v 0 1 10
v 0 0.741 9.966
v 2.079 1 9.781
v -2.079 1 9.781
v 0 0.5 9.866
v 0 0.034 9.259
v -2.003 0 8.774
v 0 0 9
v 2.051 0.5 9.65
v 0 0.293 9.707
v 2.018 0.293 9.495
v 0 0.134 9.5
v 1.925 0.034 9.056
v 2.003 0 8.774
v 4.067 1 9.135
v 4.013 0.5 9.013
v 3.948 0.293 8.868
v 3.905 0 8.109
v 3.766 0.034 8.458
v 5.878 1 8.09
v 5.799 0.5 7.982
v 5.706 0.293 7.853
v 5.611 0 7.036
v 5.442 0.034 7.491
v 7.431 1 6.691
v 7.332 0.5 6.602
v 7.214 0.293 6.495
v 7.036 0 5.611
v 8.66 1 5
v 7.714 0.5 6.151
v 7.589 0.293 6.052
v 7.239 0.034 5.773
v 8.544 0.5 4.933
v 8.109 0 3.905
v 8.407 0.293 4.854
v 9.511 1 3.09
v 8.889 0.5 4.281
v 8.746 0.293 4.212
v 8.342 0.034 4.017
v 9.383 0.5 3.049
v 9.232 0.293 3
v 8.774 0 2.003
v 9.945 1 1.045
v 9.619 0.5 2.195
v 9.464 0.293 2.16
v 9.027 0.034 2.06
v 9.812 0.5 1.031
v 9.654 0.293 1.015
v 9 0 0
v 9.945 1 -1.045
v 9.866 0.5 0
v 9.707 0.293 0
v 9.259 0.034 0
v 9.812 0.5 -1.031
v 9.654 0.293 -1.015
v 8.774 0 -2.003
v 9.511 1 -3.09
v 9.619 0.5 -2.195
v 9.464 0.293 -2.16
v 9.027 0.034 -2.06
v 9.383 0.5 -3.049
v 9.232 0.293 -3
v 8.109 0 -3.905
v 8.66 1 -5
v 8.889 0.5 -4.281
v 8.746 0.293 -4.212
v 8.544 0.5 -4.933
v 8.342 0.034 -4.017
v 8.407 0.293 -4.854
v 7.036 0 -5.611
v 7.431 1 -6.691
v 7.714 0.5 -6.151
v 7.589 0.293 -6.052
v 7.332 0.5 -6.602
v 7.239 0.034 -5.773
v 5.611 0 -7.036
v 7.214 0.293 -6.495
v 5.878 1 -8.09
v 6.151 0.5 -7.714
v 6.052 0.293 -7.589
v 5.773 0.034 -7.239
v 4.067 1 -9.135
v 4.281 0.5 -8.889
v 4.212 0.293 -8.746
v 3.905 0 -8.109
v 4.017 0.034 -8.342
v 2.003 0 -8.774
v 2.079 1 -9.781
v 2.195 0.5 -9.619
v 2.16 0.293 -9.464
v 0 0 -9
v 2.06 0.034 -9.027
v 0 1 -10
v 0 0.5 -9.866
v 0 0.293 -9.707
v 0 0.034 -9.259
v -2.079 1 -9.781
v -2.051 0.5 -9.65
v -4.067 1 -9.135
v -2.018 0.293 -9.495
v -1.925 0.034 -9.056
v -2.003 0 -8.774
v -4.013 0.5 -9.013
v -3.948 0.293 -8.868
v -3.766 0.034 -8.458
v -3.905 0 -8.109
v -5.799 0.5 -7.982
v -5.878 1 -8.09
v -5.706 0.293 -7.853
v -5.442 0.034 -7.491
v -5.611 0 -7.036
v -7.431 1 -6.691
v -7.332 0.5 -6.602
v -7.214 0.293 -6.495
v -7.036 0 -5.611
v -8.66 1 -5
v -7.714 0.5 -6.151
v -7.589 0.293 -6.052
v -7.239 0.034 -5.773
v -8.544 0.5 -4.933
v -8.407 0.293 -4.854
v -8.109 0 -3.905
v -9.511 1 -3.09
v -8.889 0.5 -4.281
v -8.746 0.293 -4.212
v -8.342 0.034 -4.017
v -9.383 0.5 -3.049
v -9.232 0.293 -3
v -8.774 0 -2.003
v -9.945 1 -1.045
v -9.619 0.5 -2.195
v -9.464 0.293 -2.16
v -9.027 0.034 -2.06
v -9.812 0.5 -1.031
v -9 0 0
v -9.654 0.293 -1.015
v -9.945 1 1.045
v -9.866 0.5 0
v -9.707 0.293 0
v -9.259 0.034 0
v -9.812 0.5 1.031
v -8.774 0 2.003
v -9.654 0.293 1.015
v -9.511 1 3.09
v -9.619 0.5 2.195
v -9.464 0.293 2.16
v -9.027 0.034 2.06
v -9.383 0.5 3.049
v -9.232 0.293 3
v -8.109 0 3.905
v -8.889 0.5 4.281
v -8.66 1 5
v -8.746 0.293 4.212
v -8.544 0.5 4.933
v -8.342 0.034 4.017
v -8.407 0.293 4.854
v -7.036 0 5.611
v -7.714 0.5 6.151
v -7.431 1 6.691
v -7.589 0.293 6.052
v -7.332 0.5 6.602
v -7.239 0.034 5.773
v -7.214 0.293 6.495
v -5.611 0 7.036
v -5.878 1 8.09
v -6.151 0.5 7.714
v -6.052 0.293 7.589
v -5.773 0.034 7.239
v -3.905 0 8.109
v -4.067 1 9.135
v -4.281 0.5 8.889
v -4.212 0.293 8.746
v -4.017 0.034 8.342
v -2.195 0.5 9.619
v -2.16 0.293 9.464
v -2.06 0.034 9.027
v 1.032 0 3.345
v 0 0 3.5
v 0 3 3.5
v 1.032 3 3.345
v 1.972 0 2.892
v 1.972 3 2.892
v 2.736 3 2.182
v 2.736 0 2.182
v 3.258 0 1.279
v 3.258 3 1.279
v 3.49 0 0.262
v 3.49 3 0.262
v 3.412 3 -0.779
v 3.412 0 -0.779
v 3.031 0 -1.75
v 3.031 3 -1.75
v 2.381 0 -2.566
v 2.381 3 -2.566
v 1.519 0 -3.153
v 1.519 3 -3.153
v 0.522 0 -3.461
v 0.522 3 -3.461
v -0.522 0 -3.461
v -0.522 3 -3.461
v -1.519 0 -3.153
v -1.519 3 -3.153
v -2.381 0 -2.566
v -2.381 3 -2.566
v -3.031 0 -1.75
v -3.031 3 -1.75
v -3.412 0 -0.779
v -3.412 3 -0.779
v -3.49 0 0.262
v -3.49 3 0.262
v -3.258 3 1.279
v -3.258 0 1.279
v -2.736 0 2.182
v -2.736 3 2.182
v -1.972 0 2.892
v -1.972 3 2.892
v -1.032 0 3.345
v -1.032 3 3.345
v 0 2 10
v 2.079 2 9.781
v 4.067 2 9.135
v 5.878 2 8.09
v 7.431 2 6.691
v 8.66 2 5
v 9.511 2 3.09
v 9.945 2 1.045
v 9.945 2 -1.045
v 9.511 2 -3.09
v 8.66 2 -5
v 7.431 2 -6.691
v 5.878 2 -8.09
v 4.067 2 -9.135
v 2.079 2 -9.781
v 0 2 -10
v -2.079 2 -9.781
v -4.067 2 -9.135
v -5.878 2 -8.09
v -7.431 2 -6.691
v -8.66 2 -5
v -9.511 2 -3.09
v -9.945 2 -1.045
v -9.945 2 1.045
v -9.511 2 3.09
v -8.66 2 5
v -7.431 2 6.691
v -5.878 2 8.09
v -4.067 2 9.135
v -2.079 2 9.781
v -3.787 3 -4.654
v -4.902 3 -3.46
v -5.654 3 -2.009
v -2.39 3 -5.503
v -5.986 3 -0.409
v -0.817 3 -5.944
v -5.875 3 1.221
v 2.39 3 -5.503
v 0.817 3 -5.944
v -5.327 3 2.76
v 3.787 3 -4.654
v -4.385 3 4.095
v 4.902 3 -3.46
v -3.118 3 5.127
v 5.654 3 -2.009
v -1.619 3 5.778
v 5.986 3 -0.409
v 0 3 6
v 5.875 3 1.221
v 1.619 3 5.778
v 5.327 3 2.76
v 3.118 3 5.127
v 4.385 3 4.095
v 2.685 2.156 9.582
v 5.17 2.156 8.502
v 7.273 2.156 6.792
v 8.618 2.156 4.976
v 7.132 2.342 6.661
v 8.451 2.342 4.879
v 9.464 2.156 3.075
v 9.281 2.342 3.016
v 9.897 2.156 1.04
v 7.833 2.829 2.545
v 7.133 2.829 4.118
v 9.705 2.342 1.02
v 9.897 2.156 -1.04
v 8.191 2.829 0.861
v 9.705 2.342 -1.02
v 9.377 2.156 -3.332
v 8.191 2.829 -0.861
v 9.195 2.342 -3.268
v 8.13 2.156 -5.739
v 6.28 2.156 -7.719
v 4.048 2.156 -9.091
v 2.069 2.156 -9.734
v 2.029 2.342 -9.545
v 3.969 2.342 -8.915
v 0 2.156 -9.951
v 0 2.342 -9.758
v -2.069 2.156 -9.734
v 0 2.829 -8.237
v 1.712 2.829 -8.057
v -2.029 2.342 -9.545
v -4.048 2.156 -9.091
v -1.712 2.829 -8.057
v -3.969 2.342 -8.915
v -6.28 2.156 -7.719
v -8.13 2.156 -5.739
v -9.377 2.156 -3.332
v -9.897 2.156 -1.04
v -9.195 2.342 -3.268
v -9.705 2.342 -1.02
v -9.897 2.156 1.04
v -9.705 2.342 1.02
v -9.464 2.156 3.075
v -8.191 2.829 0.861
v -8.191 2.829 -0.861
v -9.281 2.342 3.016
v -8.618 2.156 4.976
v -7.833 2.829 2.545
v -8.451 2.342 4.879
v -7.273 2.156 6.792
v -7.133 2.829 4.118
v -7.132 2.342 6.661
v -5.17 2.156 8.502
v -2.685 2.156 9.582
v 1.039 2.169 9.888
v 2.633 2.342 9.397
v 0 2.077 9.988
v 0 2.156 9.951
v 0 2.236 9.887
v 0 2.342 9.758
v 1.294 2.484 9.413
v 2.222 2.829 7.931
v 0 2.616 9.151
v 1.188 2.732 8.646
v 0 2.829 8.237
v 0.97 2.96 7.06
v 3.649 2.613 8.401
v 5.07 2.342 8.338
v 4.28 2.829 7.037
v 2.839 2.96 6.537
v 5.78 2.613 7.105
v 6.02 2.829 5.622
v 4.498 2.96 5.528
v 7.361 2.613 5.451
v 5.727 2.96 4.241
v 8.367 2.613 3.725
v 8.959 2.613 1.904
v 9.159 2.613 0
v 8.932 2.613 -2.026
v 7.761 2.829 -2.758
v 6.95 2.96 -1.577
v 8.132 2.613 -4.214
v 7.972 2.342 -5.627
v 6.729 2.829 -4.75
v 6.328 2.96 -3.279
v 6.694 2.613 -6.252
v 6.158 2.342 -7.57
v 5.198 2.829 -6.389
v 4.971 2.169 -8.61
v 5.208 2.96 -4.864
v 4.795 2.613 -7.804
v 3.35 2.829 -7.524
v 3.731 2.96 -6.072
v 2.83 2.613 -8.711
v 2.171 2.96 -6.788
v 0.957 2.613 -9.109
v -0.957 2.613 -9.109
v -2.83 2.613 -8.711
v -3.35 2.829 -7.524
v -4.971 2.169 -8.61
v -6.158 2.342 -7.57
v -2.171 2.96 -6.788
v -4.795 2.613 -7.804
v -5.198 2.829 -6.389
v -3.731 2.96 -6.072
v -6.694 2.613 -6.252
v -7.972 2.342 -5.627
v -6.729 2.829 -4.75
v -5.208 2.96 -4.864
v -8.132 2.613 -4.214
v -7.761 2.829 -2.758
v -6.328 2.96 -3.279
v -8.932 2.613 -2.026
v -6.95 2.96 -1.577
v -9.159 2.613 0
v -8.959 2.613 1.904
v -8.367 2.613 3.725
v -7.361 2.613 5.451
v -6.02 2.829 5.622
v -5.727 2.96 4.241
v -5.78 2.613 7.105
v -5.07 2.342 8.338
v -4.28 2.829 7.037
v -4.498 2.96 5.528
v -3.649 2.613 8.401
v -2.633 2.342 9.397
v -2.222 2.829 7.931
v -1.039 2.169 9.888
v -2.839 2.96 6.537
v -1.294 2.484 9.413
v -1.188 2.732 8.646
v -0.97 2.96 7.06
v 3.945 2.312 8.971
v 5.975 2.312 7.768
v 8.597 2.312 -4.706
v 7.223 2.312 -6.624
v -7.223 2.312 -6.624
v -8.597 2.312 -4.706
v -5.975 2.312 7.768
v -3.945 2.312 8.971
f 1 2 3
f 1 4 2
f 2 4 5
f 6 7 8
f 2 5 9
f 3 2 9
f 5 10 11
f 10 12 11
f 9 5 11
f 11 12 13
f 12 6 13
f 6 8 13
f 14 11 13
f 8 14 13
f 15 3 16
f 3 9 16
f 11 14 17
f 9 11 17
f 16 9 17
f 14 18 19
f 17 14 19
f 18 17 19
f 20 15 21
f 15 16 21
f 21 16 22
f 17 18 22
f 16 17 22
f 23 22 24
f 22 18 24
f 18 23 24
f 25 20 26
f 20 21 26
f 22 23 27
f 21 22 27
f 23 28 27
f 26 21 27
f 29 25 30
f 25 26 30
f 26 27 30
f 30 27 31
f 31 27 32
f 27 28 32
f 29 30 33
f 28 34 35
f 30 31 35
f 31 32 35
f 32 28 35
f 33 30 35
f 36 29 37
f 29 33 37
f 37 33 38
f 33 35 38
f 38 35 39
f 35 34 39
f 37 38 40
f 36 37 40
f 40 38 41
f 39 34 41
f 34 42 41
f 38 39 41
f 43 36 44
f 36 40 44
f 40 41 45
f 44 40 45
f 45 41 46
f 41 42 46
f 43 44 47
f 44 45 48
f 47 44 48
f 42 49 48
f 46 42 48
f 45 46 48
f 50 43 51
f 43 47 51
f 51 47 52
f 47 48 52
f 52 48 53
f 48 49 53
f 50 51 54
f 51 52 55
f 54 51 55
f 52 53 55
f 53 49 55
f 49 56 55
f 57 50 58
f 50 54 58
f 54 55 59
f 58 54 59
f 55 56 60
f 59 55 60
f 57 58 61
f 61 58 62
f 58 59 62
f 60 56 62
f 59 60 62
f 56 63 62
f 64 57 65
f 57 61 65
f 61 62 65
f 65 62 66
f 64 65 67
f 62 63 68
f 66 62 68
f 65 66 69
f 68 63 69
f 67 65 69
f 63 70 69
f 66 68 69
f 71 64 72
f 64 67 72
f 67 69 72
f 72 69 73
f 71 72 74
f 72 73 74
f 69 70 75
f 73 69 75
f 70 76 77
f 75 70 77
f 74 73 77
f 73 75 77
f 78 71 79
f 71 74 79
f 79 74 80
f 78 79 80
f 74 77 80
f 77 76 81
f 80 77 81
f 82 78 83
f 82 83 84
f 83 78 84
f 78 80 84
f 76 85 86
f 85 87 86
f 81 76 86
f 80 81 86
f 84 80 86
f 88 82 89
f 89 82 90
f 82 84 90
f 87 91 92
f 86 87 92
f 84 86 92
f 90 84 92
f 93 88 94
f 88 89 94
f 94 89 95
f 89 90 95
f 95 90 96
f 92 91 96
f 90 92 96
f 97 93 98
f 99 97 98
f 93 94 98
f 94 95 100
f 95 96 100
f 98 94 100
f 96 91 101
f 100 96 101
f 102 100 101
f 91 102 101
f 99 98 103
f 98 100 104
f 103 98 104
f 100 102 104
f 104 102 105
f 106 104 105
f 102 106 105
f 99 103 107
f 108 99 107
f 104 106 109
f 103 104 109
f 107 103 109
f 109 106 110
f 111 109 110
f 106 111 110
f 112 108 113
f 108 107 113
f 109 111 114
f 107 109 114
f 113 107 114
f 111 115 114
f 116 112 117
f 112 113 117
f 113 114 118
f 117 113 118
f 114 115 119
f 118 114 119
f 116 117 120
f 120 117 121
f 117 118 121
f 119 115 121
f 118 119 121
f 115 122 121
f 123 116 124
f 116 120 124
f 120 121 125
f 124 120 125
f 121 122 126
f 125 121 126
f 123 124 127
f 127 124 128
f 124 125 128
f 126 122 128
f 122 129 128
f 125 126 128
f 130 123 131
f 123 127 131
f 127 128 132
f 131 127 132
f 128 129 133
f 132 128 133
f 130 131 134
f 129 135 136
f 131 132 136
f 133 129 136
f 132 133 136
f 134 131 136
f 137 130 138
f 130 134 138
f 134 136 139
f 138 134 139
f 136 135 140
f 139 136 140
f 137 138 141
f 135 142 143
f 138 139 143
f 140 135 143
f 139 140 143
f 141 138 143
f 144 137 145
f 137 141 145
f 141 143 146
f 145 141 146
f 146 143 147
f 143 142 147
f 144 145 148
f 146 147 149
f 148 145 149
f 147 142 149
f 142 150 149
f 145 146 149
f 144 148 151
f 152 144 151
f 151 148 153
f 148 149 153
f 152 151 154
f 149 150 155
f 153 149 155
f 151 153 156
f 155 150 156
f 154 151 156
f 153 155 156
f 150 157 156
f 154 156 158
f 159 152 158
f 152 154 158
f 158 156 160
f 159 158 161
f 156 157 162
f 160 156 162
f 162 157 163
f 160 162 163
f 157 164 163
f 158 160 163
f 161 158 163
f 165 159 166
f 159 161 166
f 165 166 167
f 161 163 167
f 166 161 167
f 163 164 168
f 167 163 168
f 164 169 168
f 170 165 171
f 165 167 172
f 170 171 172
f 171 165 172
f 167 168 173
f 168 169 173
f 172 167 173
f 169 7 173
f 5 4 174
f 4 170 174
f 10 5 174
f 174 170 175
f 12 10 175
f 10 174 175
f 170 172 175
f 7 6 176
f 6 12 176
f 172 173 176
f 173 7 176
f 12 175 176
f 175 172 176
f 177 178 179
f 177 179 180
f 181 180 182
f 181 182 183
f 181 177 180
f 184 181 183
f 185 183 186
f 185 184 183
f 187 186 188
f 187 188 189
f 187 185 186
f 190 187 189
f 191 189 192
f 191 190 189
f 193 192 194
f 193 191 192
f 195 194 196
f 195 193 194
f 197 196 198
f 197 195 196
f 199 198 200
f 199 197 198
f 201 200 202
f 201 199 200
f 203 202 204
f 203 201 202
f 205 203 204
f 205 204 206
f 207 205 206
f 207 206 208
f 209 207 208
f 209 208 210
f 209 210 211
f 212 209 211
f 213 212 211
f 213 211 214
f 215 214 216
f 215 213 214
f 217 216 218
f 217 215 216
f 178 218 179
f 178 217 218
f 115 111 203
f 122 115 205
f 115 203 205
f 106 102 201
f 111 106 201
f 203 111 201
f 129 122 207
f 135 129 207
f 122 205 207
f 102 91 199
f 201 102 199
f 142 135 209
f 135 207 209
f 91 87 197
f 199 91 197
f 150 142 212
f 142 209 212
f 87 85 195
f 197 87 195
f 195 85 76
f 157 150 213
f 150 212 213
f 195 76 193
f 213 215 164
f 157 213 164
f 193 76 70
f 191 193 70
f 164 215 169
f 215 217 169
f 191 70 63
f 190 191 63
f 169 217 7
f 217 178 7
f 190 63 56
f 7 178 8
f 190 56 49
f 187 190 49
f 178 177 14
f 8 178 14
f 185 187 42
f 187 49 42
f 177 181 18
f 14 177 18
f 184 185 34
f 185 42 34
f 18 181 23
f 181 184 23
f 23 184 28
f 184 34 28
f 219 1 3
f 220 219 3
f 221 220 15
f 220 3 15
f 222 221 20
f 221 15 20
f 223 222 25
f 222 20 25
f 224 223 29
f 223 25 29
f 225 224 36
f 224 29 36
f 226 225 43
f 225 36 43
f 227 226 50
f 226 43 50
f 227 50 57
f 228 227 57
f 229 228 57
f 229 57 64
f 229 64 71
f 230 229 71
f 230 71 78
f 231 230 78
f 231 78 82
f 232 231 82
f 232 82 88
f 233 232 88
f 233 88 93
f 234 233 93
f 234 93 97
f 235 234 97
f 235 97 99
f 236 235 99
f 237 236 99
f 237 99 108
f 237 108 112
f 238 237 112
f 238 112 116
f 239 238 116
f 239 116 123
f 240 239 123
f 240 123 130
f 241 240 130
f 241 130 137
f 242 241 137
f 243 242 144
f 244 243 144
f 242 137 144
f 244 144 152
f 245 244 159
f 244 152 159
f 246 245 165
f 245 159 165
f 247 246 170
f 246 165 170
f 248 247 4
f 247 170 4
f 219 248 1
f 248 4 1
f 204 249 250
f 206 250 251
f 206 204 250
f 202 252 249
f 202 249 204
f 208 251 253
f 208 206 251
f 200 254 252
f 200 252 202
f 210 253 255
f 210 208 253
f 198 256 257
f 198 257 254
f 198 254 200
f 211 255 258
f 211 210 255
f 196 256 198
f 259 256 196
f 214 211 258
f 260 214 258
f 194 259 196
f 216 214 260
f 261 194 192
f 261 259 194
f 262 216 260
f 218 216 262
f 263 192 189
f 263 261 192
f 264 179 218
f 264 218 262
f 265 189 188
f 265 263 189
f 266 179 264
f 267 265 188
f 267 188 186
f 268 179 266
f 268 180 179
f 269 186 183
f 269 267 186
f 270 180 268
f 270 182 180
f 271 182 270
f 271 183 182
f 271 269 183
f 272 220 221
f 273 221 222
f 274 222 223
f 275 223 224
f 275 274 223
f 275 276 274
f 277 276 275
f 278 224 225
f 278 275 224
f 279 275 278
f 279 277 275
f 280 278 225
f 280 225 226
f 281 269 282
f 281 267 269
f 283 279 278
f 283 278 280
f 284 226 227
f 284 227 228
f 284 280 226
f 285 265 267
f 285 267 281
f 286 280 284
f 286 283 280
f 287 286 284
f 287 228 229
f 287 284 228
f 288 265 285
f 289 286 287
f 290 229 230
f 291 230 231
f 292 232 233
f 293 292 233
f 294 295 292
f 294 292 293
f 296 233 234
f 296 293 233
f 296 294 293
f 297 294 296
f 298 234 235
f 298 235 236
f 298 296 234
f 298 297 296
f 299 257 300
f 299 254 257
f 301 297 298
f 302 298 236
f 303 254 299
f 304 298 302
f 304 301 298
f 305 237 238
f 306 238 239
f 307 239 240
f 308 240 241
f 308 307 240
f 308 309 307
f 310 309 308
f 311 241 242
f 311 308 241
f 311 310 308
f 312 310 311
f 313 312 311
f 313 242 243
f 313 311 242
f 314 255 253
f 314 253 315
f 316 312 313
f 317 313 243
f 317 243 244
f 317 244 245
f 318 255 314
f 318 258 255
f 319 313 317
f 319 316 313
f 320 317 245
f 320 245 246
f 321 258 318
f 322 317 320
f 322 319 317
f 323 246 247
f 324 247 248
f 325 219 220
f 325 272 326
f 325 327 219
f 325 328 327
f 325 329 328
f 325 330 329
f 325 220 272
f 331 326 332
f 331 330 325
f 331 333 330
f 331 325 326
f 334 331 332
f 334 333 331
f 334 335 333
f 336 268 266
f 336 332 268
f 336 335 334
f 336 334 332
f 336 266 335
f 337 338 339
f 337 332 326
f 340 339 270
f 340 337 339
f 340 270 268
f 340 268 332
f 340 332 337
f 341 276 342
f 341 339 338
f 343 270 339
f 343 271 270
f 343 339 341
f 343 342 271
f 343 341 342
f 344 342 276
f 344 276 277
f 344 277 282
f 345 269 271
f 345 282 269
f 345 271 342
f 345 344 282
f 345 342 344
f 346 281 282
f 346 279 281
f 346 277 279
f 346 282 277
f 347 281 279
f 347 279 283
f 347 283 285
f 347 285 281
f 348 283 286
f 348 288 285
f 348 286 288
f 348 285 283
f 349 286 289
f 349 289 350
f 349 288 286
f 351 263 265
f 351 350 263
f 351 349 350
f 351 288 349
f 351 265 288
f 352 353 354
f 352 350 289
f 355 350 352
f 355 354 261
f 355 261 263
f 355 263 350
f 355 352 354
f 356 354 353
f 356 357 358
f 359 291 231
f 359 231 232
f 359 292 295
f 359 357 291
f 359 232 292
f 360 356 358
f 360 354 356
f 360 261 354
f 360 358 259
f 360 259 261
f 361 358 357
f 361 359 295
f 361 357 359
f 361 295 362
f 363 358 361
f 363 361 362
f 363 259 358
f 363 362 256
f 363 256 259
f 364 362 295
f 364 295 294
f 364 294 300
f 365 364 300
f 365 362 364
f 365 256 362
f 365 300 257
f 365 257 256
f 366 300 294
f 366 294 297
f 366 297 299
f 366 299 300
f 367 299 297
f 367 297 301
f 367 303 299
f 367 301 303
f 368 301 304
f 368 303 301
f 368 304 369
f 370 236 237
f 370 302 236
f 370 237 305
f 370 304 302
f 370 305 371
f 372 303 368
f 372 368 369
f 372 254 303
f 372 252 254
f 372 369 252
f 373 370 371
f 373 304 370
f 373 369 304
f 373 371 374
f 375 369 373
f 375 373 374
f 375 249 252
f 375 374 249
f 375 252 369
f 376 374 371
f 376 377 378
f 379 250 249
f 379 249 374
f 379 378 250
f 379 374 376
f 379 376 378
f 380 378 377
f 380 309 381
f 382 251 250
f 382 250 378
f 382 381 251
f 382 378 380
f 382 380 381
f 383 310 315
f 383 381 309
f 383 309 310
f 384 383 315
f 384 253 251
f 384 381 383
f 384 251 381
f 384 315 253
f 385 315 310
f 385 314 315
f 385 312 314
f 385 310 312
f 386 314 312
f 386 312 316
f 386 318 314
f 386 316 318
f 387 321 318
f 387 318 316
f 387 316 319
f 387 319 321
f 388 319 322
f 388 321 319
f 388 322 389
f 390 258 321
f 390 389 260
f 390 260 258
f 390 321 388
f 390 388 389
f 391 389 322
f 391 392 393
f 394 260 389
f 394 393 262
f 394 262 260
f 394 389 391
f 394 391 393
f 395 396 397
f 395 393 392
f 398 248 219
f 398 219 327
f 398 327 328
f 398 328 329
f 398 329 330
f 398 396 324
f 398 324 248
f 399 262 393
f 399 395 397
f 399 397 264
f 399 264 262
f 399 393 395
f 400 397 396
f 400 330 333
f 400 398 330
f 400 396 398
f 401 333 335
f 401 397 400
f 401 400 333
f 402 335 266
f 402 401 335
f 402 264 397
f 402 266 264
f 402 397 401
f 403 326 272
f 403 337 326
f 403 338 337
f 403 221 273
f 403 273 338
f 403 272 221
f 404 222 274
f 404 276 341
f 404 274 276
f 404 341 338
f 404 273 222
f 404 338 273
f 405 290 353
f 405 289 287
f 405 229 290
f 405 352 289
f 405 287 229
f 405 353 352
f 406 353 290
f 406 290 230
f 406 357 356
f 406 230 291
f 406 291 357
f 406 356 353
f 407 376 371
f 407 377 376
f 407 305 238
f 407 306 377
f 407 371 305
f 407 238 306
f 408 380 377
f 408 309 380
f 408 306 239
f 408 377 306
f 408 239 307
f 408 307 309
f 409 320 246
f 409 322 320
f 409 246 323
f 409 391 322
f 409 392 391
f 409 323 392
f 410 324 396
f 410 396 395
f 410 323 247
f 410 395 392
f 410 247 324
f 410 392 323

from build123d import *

# Parameters (mm, degrees)
SKETCH1_R           = 10
SKETCH1_R_2         = 3.5
BOSS_EXTRUDE1_DEPTH = 3
FILLET1_SIZE        = 1
FILLET1_SIZE_2      = 4
FILLET2_R           = 1


with BuildPart() as part:
    # Sketch1 → Boss-Extrude1 (new body)
    with BuildSketch(Plane(origin=(0, 0, 0), x_dir=(1, 0, 0), z_dir=(0, 1, 0))):
        with Locations(Location((0, 0, 0), (0, 0, 270))):
            Circle(SKETCH1_R)
        with Locations(Location((0, 0, 0), (0, 0, 270))):
            Circle(SKETCH1_R_2, mode=Mode.SUBTRACT)
    extrude(amount=BOSS_EXTRUDE1_DEPTH)

    # Fillet1
    # an asymmetric fillet: 4, 1 mm, written as the material it takes off along each edge
    with BuildSketch(Plane(origin=(0, 3, 0), x_dir=(0, 0, 1), z_dir=(-1, 0, 0))) as fillet1_piece_1:
        with BuildLine():
            Bezier((10, -FILLET1_SIZE), (10, 0), (10 - FILLET1_SIZE_2, 0), weights=[1, 0.707106781, 1])
            Line((10 - FILLET1_SIZE_2, 0), (10, 0))
            Line((10, 0), (10, -FILLET1_SIZE))
        make_face()
    revolve(axis=Axis((0, 3, 0), (0, 1, 0)), mode=Mode.SUBTRACT)

    # Fillet2
    fillet2_edges = [part.edges().sort_by_distance(p)[0] for p in [
        (0, 0, -10),
    ]]
    fillet(fillet2_edges, radius=FILLET2_R)


solid = part.part
